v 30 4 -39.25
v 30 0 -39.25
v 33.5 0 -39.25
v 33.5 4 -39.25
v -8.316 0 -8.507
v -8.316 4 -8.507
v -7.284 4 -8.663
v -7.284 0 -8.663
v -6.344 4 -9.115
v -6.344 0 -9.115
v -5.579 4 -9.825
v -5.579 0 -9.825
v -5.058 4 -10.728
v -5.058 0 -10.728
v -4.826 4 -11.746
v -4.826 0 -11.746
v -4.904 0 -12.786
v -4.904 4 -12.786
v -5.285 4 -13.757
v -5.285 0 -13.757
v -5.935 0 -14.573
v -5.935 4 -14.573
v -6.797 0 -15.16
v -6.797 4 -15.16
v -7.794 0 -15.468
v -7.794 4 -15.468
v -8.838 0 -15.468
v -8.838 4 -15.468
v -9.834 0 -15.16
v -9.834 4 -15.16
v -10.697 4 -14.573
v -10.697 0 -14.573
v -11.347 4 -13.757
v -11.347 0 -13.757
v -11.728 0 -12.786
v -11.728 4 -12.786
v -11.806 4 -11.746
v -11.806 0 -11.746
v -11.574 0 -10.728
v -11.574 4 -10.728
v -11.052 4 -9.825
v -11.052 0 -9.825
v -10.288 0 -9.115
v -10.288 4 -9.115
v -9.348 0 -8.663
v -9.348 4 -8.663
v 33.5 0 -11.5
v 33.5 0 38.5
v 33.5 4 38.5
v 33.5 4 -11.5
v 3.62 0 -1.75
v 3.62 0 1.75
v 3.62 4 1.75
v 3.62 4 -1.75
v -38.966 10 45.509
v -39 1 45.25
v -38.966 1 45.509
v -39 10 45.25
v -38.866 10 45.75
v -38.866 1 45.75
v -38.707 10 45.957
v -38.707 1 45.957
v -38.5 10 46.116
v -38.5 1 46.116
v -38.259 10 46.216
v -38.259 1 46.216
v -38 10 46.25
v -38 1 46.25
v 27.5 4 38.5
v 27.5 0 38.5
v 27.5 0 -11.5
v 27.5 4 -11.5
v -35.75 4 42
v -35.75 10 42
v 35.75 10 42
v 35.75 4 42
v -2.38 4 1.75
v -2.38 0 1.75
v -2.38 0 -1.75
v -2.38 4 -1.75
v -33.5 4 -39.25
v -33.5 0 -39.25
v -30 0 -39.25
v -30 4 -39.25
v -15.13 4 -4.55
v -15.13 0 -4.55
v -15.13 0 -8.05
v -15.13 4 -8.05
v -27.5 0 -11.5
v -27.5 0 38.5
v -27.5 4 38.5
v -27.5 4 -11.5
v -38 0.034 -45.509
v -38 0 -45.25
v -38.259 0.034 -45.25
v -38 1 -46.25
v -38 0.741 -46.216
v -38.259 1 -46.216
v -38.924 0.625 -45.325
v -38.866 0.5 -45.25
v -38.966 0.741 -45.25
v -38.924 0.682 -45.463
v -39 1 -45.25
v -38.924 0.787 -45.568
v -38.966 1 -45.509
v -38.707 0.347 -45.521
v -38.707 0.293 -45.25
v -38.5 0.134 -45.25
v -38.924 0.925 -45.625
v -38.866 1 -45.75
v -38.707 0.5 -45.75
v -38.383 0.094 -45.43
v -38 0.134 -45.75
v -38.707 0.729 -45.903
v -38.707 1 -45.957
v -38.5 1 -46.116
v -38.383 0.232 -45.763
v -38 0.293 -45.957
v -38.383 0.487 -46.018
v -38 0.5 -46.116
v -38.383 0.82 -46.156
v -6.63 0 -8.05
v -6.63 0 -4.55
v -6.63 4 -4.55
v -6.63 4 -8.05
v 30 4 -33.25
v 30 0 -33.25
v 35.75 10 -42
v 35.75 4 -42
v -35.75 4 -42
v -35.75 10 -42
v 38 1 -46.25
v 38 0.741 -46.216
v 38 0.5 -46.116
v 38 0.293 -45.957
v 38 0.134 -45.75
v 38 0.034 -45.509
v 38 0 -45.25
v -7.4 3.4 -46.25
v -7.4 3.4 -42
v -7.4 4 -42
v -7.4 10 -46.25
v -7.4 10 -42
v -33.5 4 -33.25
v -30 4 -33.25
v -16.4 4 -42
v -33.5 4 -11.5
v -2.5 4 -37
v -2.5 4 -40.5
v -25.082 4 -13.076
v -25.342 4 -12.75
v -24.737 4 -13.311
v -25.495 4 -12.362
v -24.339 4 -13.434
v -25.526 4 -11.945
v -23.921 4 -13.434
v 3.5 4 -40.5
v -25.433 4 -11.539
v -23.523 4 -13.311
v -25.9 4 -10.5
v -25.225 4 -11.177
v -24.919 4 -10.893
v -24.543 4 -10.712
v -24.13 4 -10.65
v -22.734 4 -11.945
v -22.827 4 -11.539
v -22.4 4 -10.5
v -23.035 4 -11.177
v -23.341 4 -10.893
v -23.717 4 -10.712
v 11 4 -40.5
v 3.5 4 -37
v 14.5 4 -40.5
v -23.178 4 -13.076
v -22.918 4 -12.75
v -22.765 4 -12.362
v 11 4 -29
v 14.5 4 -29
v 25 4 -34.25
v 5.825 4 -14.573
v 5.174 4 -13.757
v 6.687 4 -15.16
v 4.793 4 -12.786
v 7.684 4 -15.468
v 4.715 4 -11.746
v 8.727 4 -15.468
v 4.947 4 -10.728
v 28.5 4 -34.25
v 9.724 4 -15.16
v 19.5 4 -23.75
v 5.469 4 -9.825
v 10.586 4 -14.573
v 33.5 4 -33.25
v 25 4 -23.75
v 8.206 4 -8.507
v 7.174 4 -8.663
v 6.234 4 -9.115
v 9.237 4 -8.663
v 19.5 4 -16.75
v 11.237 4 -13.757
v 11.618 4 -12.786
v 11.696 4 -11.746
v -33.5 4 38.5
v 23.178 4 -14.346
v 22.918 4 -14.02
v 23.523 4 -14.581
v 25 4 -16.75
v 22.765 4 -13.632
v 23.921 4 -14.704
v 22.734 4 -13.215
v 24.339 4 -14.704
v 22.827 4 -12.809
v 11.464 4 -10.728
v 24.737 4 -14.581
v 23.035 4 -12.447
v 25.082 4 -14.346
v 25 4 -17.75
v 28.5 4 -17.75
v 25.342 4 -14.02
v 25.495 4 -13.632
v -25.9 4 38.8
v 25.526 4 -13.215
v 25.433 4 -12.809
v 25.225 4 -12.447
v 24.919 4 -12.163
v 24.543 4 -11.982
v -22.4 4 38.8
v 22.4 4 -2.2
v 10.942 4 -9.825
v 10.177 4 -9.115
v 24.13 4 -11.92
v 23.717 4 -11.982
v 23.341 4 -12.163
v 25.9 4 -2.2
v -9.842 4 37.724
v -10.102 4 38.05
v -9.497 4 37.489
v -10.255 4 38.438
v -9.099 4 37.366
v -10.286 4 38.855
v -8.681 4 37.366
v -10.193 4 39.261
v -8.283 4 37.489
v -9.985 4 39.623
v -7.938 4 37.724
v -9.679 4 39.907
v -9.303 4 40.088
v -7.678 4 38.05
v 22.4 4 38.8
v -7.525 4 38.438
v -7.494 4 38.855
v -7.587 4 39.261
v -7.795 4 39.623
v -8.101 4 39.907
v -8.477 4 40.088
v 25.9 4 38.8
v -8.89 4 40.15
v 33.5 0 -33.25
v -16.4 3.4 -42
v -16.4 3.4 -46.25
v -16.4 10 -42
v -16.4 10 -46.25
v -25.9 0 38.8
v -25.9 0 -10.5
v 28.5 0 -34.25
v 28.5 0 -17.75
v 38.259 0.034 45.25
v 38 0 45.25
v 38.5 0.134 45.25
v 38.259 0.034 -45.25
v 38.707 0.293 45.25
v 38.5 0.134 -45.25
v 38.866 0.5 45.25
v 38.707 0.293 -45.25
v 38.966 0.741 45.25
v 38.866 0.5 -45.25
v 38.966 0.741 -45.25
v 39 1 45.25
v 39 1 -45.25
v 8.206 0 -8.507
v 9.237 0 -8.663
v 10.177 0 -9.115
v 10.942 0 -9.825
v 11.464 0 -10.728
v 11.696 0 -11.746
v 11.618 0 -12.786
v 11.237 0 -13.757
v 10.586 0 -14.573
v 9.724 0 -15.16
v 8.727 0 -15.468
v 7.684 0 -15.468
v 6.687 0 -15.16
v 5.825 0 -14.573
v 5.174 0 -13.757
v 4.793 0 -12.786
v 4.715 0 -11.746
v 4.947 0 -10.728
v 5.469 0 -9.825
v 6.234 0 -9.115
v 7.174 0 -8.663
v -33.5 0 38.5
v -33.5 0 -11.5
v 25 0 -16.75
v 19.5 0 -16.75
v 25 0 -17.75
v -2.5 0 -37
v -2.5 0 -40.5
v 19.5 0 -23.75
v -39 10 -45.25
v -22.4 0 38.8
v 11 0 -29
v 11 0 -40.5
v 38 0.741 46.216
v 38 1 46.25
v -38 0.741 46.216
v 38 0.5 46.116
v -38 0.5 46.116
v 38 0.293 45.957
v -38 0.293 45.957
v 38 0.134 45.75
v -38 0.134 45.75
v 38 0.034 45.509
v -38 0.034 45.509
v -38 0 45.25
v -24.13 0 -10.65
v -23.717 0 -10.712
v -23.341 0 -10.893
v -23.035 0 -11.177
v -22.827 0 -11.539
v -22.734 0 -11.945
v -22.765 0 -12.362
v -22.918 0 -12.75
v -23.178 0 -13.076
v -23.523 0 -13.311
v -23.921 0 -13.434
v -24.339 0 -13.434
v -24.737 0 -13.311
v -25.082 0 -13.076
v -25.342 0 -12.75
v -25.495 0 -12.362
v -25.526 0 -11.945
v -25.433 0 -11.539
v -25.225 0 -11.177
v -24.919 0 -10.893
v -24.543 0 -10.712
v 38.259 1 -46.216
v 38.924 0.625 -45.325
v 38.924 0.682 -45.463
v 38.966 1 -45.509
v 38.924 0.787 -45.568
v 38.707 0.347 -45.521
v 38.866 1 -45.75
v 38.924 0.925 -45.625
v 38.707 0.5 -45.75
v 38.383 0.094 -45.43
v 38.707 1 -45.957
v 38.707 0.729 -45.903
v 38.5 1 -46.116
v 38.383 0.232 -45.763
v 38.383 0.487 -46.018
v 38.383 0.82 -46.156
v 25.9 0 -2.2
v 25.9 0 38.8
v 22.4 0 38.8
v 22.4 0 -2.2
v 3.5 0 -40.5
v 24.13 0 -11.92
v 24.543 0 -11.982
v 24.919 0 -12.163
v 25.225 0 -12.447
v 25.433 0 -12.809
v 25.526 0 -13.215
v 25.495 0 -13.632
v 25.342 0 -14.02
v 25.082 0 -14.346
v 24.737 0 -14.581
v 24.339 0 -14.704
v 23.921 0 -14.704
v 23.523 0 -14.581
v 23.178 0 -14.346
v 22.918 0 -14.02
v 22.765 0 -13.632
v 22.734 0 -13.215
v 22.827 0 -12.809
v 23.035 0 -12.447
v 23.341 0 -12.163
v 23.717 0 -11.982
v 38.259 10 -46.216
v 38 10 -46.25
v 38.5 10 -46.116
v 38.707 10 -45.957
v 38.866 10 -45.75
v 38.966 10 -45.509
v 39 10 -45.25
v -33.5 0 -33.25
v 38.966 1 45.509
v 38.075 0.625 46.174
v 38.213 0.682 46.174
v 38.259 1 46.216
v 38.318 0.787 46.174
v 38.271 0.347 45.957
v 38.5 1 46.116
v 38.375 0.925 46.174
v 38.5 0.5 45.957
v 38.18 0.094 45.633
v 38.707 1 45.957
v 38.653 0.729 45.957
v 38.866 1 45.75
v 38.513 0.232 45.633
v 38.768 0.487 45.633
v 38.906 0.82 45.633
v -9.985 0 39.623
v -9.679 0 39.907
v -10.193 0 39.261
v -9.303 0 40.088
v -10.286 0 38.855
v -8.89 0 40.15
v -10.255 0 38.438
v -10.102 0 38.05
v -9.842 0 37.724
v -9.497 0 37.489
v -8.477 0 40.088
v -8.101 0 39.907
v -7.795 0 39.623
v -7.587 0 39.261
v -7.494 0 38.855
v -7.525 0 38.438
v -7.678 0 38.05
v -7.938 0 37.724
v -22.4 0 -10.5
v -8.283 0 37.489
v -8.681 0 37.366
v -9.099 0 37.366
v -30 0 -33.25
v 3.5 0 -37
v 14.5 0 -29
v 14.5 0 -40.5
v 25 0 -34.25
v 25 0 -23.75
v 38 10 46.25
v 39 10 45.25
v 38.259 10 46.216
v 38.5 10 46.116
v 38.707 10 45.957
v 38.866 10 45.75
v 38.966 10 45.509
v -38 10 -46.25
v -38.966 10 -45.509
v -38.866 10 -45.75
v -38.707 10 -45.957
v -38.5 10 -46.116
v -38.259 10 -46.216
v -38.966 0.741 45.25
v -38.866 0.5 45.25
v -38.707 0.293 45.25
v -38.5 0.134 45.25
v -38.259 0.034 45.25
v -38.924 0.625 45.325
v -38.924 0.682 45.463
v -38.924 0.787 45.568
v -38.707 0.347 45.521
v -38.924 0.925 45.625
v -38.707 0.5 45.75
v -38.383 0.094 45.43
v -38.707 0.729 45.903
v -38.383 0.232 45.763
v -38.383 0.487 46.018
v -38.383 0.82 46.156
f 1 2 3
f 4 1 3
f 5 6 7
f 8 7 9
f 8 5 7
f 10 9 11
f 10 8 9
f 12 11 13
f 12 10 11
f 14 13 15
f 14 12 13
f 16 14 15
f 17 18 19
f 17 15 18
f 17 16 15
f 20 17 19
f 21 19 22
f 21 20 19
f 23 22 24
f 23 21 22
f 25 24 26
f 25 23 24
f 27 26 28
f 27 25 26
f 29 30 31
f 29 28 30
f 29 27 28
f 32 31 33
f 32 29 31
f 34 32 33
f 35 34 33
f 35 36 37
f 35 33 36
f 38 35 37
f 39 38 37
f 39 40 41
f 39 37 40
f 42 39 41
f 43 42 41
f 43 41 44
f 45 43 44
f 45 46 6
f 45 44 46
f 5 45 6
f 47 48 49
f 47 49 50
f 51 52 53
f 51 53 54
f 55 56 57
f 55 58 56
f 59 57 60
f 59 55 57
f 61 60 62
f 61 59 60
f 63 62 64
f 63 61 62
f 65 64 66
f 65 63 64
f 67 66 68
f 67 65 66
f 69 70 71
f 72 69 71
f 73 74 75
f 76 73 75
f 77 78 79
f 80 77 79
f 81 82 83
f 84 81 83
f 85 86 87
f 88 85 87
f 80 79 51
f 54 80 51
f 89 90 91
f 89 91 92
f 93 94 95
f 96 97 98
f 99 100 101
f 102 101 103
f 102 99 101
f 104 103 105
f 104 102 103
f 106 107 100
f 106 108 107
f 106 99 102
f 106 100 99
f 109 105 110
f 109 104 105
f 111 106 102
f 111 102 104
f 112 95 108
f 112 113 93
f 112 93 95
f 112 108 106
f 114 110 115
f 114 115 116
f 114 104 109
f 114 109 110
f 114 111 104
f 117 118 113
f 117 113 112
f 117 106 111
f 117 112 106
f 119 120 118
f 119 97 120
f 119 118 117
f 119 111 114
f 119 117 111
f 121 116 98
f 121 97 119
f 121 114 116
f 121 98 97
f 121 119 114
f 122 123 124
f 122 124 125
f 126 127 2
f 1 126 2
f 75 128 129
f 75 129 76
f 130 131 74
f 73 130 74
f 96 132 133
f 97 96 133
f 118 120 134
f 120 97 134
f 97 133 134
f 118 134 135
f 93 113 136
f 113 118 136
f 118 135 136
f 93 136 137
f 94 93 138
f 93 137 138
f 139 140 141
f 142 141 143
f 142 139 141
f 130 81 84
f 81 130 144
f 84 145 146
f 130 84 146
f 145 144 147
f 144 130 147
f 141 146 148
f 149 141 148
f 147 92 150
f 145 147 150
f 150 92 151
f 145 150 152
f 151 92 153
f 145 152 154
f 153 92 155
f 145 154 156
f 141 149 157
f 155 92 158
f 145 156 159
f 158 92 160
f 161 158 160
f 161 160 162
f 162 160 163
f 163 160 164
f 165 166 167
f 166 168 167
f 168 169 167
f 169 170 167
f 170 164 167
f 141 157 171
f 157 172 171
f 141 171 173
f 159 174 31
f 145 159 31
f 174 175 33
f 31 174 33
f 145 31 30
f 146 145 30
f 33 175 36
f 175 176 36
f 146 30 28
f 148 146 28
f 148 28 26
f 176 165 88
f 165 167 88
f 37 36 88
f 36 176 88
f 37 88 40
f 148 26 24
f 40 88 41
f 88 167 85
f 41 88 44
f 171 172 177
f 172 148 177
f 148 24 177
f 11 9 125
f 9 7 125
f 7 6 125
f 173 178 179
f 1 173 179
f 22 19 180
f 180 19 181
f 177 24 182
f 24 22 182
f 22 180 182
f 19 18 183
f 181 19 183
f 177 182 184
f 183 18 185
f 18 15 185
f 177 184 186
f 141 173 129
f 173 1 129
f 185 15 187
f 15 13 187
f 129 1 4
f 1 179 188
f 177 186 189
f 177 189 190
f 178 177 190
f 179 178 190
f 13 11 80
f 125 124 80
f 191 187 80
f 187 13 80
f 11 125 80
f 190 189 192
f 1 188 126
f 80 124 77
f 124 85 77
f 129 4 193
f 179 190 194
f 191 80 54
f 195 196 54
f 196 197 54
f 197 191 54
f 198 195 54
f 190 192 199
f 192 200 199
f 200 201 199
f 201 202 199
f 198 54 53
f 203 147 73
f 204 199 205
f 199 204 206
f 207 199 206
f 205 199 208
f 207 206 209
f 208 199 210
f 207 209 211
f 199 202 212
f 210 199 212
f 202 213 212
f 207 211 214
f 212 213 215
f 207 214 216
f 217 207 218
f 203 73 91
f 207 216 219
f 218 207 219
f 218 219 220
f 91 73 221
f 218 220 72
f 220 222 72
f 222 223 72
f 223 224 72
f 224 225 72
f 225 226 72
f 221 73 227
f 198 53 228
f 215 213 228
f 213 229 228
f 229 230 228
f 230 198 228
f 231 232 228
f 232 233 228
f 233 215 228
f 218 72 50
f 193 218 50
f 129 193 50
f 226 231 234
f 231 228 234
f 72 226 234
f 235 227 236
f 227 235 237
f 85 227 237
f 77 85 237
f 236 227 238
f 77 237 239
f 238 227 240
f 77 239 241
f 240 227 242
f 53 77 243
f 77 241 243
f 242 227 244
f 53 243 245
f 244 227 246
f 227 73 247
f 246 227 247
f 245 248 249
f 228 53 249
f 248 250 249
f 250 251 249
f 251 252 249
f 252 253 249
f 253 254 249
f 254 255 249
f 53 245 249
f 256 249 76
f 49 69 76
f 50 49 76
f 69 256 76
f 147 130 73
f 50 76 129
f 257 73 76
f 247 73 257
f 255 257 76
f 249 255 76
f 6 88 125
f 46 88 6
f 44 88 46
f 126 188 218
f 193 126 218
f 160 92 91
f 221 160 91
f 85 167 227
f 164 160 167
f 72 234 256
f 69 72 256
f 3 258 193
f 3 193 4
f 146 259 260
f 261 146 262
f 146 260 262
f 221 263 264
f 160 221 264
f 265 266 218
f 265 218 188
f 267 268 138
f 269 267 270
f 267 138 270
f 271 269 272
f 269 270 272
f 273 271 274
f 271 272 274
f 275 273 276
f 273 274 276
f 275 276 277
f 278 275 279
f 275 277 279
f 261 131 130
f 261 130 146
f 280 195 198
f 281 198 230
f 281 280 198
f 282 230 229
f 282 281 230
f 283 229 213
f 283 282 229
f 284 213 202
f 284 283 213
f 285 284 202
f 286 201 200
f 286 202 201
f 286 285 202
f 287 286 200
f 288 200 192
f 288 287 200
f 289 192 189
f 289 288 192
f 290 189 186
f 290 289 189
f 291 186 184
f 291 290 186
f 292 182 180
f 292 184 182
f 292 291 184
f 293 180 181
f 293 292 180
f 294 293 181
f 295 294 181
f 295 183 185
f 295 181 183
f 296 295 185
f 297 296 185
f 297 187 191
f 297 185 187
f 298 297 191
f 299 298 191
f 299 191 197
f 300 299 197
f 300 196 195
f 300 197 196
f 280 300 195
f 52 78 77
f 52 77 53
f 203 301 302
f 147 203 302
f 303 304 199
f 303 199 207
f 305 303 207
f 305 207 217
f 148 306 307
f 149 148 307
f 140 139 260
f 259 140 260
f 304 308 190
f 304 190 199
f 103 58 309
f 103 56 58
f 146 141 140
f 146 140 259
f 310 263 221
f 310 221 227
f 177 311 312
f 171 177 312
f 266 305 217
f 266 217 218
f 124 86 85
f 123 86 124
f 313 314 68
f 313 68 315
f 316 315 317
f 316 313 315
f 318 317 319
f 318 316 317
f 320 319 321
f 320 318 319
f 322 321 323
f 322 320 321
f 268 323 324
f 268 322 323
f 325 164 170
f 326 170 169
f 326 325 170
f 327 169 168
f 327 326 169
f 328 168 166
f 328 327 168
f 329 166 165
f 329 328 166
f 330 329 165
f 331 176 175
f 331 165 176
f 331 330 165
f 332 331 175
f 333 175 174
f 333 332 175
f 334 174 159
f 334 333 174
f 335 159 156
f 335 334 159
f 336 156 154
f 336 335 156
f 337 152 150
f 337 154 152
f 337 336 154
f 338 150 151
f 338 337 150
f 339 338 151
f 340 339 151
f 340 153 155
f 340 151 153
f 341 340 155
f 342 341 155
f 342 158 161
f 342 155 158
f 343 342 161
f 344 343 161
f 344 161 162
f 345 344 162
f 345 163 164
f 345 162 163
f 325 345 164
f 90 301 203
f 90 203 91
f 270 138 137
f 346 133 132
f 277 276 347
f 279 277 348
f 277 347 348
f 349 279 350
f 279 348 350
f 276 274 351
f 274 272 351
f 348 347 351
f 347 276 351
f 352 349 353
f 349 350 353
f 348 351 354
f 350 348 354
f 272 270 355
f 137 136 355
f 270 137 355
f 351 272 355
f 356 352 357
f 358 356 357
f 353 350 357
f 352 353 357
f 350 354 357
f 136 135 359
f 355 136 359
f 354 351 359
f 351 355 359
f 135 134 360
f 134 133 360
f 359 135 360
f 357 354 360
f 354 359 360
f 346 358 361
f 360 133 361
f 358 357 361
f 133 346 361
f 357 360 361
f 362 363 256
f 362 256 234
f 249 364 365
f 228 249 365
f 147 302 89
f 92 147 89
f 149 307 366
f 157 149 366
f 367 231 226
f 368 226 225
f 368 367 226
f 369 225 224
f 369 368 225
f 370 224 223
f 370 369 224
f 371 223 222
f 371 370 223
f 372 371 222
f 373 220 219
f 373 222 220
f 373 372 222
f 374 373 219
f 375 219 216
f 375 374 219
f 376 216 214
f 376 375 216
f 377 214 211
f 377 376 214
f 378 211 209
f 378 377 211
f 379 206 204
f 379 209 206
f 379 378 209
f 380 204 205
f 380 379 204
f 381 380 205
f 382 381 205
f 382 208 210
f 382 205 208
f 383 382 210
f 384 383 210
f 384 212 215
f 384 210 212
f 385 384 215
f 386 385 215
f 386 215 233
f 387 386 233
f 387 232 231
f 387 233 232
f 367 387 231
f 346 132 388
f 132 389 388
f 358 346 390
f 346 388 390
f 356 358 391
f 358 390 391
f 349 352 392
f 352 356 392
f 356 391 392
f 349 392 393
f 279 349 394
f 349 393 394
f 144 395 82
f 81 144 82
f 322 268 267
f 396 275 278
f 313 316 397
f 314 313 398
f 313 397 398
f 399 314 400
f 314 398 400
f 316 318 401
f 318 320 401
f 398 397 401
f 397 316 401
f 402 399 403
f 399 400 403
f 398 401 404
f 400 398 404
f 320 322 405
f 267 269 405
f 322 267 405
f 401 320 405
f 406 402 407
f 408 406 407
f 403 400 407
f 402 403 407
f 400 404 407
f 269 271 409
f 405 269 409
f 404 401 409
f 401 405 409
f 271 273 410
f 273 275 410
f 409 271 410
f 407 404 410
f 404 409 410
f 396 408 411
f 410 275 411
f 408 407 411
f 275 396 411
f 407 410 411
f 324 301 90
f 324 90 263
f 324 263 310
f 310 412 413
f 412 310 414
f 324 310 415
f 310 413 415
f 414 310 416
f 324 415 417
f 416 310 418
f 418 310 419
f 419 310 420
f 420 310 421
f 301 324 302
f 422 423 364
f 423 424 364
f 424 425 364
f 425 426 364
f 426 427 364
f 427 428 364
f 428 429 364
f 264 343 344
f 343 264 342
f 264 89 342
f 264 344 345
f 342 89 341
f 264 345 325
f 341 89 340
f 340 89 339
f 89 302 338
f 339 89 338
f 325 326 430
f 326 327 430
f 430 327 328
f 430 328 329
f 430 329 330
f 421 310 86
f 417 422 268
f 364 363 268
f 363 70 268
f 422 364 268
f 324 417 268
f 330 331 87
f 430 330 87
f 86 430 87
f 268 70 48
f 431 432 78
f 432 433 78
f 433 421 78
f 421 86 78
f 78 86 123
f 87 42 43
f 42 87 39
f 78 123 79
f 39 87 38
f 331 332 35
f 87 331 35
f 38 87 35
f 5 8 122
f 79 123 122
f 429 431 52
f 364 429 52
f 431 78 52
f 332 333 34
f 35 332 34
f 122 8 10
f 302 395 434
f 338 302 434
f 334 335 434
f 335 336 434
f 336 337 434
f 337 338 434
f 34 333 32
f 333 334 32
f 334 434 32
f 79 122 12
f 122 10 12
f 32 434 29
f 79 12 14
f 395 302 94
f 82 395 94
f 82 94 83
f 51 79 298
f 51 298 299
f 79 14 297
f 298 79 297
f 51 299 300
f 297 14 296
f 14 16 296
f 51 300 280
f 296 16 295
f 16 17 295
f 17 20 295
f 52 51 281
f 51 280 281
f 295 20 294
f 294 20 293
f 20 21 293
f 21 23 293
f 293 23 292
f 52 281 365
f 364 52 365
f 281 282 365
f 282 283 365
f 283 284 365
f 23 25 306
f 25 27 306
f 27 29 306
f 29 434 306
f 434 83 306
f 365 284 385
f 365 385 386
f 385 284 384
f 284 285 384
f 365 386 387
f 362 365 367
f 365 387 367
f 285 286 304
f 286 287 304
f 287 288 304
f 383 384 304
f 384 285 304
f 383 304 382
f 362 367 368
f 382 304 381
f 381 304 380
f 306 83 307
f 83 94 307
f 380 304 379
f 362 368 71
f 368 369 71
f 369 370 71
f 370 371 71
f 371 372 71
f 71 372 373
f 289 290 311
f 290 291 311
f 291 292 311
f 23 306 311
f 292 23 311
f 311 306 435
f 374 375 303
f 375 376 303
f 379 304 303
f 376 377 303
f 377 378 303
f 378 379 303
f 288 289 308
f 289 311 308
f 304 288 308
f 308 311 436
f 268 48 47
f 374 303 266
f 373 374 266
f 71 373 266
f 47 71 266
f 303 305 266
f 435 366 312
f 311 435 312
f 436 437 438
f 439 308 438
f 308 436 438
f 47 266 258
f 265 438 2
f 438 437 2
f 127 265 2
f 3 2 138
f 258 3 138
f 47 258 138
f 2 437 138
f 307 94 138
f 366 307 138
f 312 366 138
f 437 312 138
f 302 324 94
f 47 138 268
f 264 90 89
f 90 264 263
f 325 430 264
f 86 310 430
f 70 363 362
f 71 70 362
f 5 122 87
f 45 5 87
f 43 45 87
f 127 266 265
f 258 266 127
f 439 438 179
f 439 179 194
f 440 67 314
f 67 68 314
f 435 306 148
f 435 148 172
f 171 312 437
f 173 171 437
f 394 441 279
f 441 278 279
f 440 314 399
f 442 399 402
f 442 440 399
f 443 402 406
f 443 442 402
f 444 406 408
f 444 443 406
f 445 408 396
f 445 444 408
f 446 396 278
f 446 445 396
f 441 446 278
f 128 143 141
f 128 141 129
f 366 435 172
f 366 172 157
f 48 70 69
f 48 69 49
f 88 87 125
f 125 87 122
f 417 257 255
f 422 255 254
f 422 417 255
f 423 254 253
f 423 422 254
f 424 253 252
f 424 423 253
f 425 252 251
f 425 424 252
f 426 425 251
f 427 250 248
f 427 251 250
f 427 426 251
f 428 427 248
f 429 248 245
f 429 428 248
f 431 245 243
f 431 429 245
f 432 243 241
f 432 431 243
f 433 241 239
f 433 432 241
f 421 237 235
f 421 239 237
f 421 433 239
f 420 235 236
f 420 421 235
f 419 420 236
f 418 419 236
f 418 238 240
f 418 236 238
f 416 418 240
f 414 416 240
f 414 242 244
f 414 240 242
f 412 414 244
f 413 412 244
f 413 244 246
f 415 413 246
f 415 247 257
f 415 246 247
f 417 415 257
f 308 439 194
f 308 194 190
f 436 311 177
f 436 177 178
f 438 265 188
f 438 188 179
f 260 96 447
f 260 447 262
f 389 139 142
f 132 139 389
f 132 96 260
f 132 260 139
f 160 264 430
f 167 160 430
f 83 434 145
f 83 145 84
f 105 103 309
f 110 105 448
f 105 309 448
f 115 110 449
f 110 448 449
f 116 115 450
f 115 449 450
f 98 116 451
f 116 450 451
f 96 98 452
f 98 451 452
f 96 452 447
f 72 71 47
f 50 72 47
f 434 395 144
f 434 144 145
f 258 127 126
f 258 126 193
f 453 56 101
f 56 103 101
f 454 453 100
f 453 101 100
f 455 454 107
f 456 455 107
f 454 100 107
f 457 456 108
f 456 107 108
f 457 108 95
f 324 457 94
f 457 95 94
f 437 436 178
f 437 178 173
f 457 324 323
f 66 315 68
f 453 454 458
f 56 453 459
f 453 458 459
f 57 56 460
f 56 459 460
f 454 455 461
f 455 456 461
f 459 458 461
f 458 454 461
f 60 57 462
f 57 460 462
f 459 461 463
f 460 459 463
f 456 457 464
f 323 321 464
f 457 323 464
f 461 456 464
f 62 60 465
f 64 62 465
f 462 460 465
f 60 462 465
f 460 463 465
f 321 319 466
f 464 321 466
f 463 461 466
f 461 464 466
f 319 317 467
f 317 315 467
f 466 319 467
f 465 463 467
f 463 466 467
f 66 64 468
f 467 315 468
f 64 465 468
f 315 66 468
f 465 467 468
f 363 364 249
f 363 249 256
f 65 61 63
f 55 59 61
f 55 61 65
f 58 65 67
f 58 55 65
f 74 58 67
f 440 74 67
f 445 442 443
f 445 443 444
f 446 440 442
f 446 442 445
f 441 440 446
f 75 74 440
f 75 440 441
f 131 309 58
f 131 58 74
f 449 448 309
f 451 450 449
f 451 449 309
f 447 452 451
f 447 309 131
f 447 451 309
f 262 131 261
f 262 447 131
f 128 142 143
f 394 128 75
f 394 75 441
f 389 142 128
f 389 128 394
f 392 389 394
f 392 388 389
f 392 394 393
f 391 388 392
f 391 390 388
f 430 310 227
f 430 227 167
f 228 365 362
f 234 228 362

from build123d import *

# Parameters (mm, degrees)
SKETCH1_W            = 78
SKETCH1_H            = 92.5
SKETCH1_R            = 1.4
SKETCH1_R_2          = 3.5
SKETCH1_W_2          = 6
SKETCH1_H_2          = 50
SKETCH1_W_3          = 3.5
SKETCH1_H_3          = 6
SKETCH1_H_4          = 49.3
SKETCH1_H_5          = 41
SKETCH1_H_6          = 11.5
SKETCH1_H_7          = 3.5
SKETCH1_W_4          = 8.5
BASE_DEPTH           = 10
SKETCH2_W            = 71.5
SKETCH2_H            = 84
PCB_CUTOUT_DEPTH     = 6
SKETCH3_W            = 9
SKETCH3_H            = 6.6
USB_SLOT_DEPTH       = 4.25
F_1MM_EDGE_FILLETS_R = 1


with BuildPart() as part:
    # Sketch1 → Base (new body)
    with BuildSketch(Plane(origin=(0, 0, 0), x_dir=(1, 0, 0), z_dir=(0, 1, 0))):
        Rectangle(SKETCH1_W, SKETCH1_H)
        with Locations(Location((-24.13, 12.05, 0), (0, 0, 270))):
            Circle(SKETCH1_R, mode=Mode.SUBTRACT)
        with Locations(Location((24.13, 13.32, 0), (0, 0, 270))):
            Circle(SKETCH1_R, mode=Mode.SUBTRACT)
        with Locations(Location((-8.89, -38.75, 0), (0, 0, 270))):
            Circle(SKETCH1_R, mode=Mode.SUBTRACT)
        with Locations(Location((8.2055, 12.0071, 0), (0, 0, 270))):
            Circle(SKETCH1_R_2, mode=Mode.SUBTRACT)
        with Locations(Location((-8.3159, 12.0071, 0), (0, 0, 270))):
            Circle(SKETCH1_R_2, mode=Mode.SUBTRACT)
        with Locations((-30.5, -13.5)):
            Rectangle(SKETCH1_W_2, SKETCH1_H_2, mode=Mode.SUBTRACT)
        with Locations((30.5, -13.5)):
            Rectangle(SKETCH1_W_2, SKETCH1_H_2, mode=Mode.SUBTRACT)
        with Locations((31.75, 36.25)):
            Rectangle(SKETCH1_W_3, SKETCH1_H_3, mode=Mode.SUBTRACT)
        with Locations((-31.75, 36.25)):
            Rectangle(SKETCH1_W_3, SKETCH1_H_3, mode=Mode.SUBTRACT)
        Polygon((25, 34.25), (25, 23.75), (19.5, 23.75), (19.5, 16.75), (25, 16.75), (25, 17.75), (28.5, 17.75), (28.5, 34.25), align=None, mode=Mode.SUBTRACT)
        with Locations((-24.15, -14.15)):
            Rectangle(SKETCH1_W_3, SKETCH1_H_4, mode=Mode.SUBTRACT)
        with Locations((24.15, -18.3)):
            Rectangle(SKETCH1_W_3, SKETCH1_H_5, mode=Mode.SUBTRACT)
        with Locations((12.75, 34.75)):
            Rectangle(SKETCH1_W_3, SKETCH1_H_6, mode=Mode.SUBTRACT)
        with Locations((0.5, 38.75)):
            Rectangle(SKETCH1_W_2, SKETCH1_H_7, mode=Mode.SUBTRACT)
        with Locations((-10.88, 6.3)):
            Rectangle(SKETCH1_W_4, SKETCH1_H_7, mode=Mode.SUBTRACT)
        with Locations((0.62, 0)):
            Rectangle(SKETCH1_W_2, SKETCH1_H_7, mode=Mode.SUBTRACT)
    extrude(amount=BASE_DEPTH)

    # Sketch2 → PCB Cutout (cut)
    with BuildSketch(Plane.XZ.offset(-10)):
        Rectangle(SKETCH2_W, SKETCH2_H)
    extrude(amount=PCB_CUTOUT_DEPTH, mode=Mode.SUBTRACT)

    # Sketch3 → USB Slot (cut)
    with BuildSketch(Plane(origin=(0, 0, -46.25), x_dir=(-1, 0, 0), z_dir=(0, 0, -1))):
        with Locations((11.9, 6.7)):
            Rectangle(SKETCH3_W, SKETCH3_H)
    extrude(amount=-USB_SLOT_DEPTH, mode=Mode.SUBTRACT)

    # 1mm Edge Fillets
    f_1mm_edge_fillets_edges = [part.edges().sort_by_distance(p)[0] for p in [
        (0, 0, -46.25),
        (39, 0, 0),
        (0, 0, 46.25),
        (-39, 0, 0),
        (-39, 5, -46.25),
        (39, 5, -46.25),
        (39, 5, 46.25),
        (-39, 5, 46.25),
    ]]
    fillet(f_1mm_edge_fillets_edges, radius=F_1MM_EDGE_FILLETS_R)


solid = part.part
